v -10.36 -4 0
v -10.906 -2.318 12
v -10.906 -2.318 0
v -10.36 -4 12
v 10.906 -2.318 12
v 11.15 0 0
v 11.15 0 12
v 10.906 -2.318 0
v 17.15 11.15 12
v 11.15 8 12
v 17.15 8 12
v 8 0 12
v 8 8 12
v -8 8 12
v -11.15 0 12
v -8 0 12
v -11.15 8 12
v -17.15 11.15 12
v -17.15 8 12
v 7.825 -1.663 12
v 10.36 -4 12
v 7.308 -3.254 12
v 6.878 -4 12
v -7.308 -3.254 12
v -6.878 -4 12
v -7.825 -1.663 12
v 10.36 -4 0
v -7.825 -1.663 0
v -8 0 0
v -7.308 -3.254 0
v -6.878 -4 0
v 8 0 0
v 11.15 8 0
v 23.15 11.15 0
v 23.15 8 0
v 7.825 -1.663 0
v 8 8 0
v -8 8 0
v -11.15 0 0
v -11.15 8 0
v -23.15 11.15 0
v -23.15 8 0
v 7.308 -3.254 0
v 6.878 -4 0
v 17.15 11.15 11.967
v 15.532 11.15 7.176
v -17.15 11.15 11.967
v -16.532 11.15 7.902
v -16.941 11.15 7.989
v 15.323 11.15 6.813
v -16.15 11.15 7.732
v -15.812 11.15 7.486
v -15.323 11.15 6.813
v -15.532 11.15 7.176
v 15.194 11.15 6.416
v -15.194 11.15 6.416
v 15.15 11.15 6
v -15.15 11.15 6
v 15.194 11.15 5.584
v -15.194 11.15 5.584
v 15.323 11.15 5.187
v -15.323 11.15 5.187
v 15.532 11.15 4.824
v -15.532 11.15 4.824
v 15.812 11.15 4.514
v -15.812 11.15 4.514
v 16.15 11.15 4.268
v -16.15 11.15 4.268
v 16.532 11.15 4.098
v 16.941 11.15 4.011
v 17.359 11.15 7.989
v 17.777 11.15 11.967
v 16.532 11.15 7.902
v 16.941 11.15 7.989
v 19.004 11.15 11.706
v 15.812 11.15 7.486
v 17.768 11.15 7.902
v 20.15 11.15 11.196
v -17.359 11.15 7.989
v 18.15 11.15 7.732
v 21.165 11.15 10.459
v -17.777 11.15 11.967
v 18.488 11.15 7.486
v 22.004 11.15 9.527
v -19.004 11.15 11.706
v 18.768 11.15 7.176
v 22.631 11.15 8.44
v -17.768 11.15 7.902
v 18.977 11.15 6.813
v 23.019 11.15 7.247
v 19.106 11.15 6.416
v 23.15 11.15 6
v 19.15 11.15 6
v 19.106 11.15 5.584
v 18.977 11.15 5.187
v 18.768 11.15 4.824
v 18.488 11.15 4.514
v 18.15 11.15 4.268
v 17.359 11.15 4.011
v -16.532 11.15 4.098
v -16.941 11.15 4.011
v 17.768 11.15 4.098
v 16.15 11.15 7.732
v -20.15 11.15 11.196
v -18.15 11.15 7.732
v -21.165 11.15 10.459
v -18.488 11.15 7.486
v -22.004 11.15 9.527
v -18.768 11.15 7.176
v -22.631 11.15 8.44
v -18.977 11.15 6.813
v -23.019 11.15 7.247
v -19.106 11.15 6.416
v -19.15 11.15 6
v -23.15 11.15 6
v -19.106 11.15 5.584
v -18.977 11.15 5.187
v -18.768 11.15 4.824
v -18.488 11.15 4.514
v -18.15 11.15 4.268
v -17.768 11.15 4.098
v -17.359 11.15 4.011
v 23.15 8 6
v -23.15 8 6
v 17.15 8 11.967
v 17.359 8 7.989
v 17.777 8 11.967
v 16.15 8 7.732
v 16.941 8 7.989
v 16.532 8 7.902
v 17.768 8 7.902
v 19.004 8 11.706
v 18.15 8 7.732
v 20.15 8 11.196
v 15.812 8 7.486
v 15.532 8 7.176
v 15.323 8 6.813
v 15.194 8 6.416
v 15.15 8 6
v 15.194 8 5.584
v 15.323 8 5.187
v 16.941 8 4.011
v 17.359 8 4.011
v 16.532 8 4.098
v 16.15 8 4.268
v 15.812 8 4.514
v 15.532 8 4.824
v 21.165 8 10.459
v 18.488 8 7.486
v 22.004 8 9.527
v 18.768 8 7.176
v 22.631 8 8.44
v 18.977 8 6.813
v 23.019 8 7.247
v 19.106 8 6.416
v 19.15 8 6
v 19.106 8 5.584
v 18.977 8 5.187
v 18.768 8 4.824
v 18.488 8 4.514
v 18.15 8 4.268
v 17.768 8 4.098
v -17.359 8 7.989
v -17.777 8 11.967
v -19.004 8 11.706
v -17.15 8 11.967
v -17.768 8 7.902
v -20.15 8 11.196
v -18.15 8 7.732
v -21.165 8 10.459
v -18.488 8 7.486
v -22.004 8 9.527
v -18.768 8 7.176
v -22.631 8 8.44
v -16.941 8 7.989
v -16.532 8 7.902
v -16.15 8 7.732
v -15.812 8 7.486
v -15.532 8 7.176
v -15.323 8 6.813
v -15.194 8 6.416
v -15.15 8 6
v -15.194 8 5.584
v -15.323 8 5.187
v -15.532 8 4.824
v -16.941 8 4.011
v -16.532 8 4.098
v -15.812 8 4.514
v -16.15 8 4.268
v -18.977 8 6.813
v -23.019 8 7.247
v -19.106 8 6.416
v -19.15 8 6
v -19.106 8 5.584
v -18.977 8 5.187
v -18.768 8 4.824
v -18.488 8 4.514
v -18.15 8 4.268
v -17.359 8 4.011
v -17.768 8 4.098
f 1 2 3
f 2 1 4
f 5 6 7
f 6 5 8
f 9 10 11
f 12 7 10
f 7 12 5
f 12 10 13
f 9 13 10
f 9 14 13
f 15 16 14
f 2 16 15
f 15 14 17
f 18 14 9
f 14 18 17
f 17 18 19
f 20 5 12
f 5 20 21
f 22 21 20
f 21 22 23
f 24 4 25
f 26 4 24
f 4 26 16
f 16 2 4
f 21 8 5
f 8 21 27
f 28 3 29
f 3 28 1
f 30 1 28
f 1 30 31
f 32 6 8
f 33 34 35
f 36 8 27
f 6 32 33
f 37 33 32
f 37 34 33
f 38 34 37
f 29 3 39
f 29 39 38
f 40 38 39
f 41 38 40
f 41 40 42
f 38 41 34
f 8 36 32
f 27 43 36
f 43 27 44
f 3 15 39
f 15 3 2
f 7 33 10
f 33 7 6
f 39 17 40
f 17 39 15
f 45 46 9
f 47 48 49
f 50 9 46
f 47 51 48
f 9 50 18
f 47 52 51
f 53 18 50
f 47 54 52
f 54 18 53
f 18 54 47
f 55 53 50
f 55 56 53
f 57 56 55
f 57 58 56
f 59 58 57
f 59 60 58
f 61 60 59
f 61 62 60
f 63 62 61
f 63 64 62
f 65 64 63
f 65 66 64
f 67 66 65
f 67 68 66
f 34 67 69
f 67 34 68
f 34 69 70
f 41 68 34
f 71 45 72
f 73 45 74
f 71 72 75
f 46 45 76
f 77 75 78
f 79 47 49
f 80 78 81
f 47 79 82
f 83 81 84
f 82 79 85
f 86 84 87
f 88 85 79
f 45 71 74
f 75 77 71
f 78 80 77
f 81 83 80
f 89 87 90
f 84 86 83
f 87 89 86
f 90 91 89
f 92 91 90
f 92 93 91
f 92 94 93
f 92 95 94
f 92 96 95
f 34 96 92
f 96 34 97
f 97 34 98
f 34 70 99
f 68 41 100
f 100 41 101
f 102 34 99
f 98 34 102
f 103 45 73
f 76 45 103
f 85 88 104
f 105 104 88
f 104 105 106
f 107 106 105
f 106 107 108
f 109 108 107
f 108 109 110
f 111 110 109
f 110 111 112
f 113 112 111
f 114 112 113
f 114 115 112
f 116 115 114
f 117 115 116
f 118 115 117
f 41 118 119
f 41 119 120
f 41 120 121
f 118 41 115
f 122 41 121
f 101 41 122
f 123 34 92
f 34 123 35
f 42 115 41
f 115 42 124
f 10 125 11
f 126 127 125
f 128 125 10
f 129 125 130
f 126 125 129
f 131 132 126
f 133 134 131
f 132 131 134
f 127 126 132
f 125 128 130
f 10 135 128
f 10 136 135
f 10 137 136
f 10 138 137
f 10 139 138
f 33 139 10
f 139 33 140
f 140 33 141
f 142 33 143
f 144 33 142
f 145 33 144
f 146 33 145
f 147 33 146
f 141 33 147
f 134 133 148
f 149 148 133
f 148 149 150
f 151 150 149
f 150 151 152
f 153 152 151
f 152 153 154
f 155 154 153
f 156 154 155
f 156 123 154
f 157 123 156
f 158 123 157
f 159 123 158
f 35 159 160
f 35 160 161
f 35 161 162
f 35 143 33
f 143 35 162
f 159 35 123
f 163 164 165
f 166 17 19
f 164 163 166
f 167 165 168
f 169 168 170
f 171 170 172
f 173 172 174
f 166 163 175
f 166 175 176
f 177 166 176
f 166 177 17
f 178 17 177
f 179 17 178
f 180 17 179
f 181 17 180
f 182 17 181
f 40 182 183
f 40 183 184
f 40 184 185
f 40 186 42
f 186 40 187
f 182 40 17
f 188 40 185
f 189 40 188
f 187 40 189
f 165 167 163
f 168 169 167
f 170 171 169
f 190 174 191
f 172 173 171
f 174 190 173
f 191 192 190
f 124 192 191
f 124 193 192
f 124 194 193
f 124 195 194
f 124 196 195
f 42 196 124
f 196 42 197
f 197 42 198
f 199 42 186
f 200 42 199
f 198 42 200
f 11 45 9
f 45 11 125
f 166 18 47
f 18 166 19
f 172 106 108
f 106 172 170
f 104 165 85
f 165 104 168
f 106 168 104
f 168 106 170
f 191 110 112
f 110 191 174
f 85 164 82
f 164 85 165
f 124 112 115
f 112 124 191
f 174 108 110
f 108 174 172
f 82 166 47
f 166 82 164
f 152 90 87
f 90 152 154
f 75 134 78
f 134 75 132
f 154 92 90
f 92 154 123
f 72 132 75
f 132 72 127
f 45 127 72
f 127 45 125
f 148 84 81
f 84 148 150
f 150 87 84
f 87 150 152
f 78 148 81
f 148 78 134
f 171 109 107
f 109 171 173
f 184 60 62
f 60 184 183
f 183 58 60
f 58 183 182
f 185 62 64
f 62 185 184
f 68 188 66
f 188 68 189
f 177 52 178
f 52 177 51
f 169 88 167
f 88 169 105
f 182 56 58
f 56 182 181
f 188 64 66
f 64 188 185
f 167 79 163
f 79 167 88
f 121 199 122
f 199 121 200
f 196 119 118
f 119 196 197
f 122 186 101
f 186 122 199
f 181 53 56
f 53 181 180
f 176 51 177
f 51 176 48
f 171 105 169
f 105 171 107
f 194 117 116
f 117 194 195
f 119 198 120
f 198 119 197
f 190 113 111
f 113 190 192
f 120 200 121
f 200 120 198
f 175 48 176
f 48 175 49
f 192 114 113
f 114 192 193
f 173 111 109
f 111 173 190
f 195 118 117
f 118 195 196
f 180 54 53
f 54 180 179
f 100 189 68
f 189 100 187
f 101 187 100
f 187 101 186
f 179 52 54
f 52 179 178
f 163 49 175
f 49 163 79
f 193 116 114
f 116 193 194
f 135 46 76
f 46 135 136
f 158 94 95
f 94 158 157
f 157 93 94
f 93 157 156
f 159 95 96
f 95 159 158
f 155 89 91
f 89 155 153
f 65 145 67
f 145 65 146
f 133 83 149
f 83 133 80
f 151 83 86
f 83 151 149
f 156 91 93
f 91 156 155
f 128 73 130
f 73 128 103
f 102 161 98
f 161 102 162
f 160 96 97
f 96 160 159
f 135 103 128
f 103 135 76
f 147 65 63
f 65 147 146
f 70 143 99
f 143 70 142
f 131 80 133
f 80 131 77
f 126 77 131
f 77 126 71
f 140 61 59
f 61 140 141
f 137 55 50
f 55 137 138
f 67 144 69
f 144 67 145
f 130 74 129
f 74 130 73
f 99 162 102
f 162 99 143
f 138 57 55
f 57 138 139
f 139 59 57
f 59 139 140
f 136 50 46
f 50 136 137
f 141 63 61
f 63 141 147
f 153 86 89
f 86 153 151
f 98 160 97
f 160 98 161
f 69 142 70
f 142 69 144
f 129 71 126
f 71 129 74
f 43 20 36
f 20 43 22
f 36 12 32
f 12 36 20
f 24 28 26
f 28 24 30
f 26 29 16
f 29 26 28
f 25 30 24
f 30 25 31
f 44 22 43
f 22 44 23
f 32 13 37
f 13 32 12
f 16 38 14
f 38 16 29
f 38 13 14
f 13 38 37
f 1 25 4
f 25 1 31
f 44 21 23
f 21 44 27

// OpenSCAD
/*
  Mixtape Mendel - A Fully Parametric RepRap
    Copyright (C) 2011  Steve Kelly

    This program is free software: you can redistribute it and/or modify
    it under the terms of the GNU General Public License as published by
    the Free Software Foundation, either version 3 of the License, or
    (at your option) any later version.

    This program is distributed in the hope that it will be useful,
    but WITHOUT ANY WARRANTY; without even the implied warranty of
    MERCHANTABILITY or FITNESS FOR A PARTICULAR PURPOSE.  See the
    GNU General Public License for more details.

    You should have received a copy of the GNU General Public License
    along with this program.  If not, see <http://www.gnu.org/licenses/>.
*/

beltthick =2;
smoothroddia = 8;
bushingheight = 12;
bushingod = 16;
mdfthick = 6.35;
secscrewdia = 4;
frameroddia = 8; 
pulleydia = 15;

//include <config.scad>;

holderwall = frameroddia+(pulleydia/2-frameroddia/2)-mdfthick-(bushingod/2-smoothroddia)-beltthick;

$fn = 30;

difference(){
	union(){
		translate([0,0,0])cylinder(r=bushingod/2+holderwall, h=bushingheight);
		translate([-bushingod/2-holderwall,0,0])cube([bushingod+holderwall*2,bushingod/2+holderwall,bushingheight]);
		translate([-bushingod/2-holderwall-bushingheight,bushingod/2,0])cube([bushingod+holderwall*2+bushingheight*2,holderwall,bushingheight/2]);
		translate([-bushingod/2-holderwall-bushingheight/2,bushingod/2,0])cube([bushingod+holderwall*2+bushingheight,holderwall,bushingheight]);
		translate([-bushingod/2-holderwall-bushingheight/2,bushingod/2,bushingheight/2])rotate([-90,0,0])cylinder(r=bushingheight/2, h=holderwall);
		translate([bushingod/2+holderwall+bushingheight/2,bushingod/2,bushingheight/2])rotate([-90,0,0])cylinder(r=bushingheight/2, h=holderwall);



	}
	translate([-bushingod/2-holderwall-bushingheight/2,bushingod/2-1,bushingheight/2])rotate([-90,0,0])cylinder(r=secscrewdia/2, h=holderwall+2);
	translate([bushingod/2+holderwall+bushingheight/2,bushingod/2-1,bushingheight/2])rotate([-90,0,0])cylinder(r=secscrewdia/2, h=holderwall+2);
	translate([0,0,-1])cylinder(r=bushingod/2, h=bushingheight+2);
	translate([-bushingod/2,0,-1])cube([bushingod,bushingod/2,bushingheight+2]);
	translate([-bushingod/2-holderwall,-bushingod/2-holderwall,-1])cube([bushingod+holderwall*2,bushingod*0.25+holderwall,bushingheight+2]);
}
